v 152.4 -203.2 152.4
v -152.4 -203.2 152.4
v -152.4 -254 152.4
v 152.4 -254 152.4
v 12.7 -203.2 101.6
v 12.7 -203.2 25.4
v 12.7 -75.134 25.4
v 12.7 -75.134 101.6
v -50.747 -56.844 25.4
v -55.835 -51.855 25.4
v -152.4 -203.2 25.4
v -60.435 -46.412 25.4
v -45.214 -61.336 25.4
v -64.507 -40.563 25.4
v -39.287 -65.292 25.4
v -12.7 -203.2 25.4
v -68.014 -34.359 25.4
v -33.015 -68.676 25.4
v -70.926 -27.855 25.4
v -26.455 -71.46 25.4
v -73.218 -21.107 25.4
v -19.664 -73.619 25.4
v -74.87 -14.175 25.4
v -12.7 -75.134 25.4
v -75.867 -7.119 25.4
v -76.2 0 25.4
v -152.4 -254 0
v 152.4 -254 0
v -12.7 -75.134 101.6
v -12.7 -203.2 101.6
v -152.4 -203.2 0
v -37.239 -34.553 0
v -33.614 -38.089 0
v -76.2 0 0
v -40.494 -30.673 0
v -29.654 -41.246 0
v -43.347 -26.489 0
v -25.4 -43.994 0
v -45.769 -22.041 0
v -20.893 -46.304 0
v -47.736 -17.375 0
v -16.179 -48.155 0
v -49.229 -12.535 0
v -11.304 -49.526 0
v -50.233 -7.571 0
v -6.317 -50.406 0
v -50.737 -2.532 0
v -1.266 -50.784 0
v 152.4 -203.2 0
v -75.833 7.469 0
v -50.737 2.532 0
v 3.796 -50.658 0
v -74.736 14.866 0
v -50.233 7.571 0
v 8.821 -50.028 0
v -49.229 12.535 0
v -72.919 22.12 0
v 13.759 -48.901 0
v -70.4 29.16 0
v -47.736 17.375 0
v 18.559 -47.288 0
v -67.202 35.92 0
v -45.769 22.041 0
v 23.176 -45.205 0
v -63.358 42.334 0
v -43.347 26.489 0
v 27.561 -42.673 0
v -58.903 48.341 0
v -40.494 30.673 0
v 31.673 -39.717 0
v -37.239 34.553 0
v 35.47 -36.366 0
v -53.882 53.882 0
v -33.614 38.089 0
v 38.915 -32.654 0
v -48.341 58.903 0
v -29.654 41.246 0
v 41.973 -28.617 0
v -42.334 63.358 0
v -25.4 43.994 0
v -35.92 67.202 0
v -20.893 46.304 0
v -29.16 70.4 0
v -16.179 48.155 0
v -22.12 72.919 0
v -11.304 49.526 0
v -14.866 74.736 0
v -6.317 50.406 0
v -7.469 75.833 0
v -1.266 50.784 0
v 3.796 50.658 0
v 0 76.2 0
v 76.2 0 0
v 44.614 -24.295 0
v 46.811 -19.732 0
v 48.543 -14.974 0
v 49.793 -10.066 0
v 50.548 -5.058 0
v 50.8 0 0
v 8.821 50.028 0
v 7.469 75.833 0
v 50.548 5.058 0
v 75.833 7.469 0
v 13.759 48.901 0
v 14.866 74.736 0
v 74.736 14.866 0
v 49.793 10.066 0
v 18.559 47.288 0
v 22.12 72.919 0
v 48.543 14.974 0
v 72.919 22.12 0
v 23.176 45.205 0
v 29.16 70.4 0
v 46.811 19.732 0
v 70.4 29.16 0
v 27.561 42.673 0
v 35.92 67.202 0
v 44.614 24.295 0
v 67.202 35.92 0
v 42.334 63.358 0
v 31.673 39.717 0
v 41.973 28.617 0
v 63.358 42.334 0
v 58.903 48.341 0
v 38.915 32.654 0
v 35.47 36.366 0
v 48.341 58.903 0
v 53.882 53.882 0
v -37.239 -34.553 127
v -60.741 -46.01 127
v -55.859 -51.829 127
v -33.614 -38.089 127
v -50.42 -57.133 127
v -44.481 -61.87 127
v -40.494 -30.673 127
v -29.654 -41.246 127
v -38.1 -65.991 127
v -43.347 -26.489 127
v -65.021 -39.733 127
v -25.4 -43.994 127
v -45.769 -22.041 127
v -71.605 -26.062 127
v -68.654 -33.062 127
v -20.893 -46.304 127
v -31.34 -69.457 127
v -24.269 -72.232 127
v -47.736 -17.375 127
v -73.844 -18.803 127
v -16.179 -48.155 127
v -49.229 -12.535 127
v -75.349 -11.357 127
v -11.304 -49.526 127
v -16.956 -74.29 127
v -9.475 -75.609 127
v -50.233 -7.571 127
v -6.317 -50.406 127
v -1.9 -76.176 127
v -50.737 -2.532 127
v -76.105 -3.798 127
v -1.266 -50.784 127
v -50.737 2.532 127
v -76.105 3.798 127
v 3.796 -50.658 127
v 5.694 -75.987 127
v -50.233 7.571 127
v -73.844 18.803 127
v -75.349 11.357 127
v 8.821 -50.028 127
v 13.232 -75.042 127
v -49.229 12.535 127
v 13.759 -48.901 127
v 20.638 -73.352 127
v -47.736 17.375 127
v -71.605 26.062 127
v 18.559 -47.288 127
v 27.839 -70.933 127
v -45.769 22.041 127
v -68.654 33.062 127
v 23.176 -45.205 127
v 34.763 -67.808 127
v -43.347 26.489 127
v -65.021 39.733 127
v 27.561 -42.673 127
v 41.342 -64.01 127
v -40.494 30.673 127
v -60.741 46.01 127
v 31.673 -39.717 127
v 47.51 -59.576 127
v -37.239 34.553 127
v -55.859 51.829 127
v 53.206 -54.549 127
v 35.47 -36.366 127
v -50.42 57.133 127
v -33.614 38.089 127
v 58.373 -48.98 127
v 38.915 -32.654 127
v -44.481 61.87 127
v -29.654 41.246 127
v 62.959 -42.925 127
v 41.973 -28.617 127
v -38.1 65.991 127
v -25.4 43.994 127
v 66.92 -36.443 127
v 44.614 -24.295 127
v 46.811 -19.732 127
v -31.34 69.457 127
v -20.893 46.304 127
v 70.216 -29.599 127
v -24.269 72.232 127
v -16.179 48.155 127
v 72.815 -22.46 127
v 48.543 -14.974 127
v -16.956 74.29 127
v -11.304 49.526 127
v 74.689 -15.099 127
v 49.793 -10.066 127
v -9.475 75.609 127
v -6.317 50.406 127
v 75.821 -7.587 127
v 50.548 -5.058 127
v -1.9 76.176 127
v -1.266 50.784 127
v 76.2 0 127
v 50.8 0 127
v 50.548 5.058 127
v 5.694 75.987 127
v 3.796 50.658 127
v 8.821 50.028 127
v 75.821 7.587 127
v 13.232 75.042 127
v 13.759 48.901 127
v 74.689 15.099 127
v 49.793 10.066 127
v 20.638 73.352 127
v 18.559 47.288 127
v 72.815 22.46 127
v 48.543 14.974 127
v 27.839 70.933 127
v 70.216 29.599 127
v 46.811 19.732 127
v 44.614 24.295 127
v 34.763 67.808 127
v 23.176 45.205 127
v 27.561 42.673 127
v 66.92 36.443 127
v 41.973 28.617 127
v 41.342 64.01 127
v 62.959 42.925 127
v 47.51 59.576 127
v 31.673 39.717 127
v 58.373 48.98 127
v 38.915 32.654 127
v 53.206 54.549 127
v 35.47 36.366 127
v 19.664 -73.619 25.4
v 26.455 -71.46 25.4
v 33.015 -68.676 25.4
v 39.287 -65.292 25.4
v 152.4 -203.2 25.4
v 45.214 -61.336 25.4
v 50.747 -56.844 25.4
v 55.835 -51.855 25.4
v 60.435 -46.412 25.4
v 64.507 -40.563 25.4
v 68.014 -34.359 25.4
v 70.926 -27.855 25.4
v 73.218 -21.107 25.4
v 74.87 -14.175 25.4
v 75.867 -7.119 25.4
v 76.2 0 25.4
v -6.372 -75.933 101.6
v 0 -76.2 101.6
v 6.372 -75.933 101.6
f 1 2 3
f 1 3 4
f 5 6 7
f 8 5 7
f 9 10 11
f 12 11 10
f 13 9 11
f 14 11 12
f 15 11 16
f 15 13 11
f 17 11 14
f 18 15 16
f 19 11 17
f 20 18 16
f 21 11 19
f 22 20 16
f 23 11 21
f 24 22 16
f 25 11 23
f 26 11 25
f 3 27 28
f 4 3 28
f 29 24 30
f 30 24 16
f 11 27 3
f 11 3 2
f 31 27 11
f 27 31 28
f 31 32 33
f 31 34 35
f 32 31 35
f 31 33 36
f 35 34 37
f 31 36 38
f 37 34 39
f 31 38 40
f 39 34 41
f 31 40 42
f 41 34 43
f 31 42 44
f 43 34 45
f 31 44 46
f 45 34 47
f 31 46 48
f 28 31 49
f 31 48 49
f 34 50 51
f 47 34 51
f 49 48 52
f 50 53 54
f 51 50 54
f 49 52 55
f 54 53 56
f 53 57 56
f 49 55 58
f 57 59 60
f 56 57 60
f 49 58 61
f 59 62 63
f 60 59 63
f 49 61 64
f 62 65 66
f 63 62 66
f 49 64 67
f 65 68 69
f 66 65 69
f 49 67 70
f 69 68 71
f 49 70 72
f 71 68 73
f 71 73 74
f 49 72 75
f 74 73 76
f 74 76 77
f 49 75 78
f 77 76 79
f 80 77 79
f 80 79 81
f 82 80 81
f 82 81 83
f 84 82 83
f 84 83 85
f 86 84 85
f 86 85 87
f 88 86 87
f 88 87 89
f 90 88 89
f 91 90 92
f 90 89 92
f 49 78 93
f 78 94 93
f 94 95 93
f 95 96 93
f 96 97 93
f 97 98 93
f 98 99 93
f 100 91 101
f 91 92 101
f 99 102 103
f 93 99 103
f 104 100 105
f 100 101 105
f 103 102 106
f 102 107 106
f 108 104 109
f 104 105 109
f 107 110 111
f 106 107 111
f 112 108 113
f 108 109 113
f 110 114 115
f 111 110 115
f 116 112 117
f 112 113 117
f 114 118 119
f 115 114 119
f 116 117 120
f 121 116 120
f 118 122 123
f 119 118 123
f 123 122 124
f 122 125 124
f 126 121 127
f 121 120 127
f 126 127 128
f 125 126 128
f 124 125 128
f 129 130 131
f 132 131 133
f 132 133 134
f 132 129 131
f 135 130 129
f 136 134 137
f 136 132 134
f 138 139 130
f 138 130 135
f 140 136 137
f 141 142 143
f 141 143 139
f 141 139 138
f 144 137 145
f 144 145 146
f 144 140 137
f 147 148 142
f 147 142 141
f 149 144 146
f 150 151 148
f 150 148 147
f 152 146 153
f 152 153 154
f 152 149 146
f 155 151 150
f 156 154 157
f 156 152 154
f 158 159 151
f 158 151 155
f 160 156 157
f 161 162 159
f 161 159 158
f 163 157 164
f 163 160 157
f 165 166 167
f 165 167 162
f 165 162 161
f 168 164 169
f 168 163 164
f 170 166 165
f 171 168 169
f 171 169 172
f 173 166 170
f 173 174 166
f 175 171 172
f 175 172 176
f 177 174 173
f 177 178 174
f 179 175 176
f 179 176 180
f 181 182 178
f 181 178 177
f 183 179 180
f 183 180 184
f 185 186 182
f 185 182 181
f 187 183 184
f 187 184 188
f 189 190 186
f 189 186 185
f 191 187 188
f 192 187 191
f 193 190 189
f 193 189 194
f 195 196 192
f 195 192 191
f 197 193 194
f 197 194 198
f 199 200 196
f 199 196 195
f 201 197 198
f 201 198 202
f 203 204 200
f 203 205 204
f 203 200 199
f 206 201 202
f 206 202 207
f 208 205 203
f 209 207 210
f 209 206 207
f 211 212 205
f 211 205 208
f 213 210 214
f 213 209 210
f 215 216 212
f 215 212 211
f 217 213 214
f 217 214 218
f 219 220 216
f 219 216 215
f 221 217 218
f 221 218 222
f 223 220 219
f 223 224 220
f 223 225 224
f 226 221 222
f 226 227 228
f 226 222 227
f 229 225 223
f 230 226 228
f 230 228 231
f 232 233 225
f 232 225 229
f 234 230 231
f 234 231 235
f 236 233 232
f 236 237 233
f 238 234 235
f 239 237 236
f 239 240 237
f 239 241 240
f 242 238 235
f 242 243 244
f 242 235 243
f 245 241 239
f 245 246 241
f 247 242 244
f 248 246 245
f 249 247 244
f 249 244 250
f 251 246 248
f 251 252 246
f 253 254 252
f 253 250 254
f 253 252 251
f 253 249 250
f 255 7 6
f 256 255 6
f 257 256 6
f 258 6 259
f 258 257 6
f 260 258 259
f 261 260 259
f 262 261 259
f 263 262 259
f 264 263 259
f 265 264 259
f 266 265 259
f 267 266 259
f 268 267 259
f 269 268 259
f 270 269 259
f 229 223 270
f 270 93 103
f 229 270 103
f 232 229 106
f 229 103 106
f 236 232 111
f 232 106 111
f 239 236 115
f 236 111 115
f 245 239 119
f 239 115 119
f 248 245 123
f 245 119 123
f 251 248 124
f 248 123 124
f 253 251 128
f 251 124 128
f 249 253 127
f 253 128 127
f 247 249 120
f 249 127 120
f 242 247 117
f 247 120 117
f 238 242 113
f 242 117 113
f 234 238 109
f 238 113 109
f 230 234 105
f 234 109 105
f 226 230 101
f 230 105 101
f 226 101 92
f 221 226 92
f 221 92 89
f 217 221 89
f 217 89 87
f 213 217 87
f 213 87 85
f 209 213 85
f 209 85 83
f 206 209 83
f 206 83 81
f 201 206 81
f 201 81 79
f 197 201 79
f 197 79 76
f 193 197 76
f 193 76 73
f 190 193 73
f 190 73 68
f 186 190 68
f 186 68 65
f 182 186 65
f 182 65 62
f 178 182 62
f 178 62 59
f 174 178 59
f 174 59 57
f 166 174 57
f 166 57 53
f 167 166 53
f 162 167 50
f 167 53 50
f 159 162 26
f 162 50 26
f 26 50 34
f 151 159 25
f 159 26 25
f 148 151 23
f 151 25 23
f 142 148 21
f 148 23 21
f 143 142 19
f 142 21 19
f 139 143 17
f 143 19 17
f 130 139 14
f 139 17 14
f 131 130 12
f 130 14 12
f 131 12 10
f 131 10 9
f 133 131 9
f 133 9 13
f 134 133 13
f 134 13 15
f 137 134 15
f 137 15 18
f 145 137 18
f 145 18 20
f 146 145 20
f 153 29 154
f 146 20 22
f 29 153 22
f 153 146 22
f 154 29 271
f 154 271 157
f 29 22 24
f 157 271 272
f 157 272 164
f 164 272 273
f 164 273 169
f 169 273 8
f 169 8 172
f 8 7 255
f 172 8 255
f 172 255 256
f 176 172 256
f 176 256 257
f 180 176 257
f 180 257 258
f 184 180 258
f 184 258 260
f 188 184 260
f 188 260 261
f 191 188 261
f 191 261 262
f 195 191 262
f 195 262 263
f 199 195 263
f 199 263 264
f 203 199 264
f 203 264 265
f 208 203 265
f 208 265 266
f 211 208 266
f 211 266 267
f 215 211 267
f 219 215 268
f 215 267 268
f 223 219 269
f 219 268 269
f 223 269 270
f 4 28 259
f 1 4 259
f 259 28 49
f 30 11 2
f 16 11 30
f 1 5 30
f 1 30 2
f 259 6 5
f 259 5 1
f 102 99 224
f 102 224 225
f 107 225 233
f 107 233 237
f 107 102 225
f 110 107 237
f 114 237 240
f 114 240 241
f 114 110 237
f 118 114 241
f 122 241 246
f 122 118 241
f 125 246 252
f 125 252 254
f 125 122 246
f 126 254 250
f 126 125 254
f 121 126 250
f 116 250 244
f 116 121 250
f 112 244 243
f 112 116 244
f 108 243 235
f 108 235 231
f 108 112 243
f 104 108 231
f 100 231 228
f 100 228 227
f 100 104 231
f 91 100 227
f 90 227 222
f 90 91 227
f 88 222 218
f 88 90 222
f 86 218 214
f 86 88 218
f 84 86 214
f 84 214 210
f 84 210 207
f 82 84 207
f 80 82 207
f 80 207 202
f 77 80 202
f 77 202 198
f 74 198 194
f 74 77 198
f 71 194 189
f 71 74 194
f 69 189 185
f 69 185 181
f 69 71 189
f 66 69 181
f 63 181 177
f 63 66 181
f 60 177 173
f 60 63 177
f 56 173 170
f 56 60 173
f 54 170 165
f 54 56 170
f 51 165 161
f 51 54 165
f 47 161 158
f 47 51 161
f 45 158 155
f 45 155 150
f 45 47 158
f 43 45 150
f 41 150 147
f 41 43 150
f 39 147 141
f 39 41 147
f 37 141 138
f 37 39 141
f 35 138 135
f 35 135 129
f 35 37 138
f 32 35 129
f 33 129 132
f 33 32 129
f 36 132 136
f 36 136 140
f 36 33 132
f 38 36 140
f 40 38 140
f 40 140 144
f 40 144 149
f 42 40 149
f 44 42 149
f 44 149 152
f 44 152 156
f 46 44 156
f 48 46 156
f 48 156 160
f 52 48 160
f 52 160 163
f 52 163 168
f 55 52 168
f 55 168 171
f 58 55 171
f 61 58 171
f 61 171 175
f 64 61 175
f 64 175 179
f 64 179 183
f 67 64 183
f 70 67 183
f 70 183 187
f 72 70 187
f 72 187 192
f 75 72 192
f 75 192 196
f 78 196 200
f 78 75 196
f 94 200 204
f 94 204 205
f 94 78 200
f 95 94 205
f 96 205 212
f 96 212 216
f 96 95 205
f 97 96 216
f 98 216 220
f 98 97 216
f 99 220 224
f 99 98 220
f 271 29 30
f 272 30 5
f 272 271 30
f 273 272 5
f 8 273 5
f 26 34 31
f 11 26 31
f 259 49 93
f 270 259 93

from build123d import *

# Parameters (mm, degrees)
SKETCH2_R            = 50.8
BOSS_EXTRUDE7_DEPTH  = 127
BOSS_EXTRUDE8_DEPTH  = 101.6
BOSS_EXTRUDE9_DEPTH  = 152.4
BOSS_EXTRUDE10_DEPTH = 25.4


with BuildPart() as part:
    # Sketch2 → Boss-Extrude7 (new body)
    with BuildSketch(Plane.XY):
        with BuildLine():
            ThreePointArc((76.2, 0), (0, 76.2), (-76.2, 0))
            ThreePointArc((-76.2, 0), (-58.198711326, -49.186888497), (-12.7, -75.134213245))
            ThreePointArc((-12.7, -75.134213245), (0, -76.2), (12.7, -75.134213245))
            ThreePointArc((12.7, -75.134213245), (58.198711326, -49.186888497), (76.2, 0))
        make_face()
        Circle(SKETCH2_R, mode=Mode.SUBTRACT)
    extrude(amount=BOSS_EXTRUDE7_DEPTH)

    # Sketch2<11> → Boss-Extrude8 (add)
    with BuildSketch(Plane.XY):
        with BuildLine():
            ThreePointArc((12.7, -75.134213245), (0, -76.2), (-12.7, -75.134213245))
            Line((-12.7, -75.134213245), (-12.7, -203.2))
            Line((-12.7, -203.2), (12.7, -203.2))
            Line((12.7, -203.2), (12.7, -75.134213245))
        make_face()
    extrude(amount=BOSS_EXTRUDE8_DEPTH)

    # Sketch2<12> → Boss-Extrude9 (add)
    with BuildSketch(Plane.XY):
        Polygon((-12.7, -203.2), (-152.4, -203.2), (-152.4, -254), (152.4, -254), (152.4, -203.2), (12.7, -203.2), align=None)
    extrude(amount=BOSS_EXTRUDE9_DEPTH)

    # Sketch2<13> → Boss-Extrude10 (add)
    with BuildSketch(Plane.XY):
        with BuildLine():
            ThreePointArc((-12.7, -75.134213245), (-58.198711326, -49.186888497), (-76.2, 0))
            Line((-76.2, 0), (-152.4, -203.2))
            Line((-152.4, -203.2), (-12.7, -203.2))
            Line((-12.7, -203.2), (-12.7, -75.134213245))
        make_face()
        with BuildLine():
            Line((152.4, -203.2), (76.2, 0))
            ThreePointArc((76.2, 0), (58.198711326, -49.186888497), (12.7, -75.134213245))
            Line((12.7, -75.134213245), (12.7, -203.2))
            Line((12.7, -203.2), (152.4, -203.2))
        make_face()
    extrude(amount=BOSS_EXTRUDE10_DEPTH)


solid = part.part
